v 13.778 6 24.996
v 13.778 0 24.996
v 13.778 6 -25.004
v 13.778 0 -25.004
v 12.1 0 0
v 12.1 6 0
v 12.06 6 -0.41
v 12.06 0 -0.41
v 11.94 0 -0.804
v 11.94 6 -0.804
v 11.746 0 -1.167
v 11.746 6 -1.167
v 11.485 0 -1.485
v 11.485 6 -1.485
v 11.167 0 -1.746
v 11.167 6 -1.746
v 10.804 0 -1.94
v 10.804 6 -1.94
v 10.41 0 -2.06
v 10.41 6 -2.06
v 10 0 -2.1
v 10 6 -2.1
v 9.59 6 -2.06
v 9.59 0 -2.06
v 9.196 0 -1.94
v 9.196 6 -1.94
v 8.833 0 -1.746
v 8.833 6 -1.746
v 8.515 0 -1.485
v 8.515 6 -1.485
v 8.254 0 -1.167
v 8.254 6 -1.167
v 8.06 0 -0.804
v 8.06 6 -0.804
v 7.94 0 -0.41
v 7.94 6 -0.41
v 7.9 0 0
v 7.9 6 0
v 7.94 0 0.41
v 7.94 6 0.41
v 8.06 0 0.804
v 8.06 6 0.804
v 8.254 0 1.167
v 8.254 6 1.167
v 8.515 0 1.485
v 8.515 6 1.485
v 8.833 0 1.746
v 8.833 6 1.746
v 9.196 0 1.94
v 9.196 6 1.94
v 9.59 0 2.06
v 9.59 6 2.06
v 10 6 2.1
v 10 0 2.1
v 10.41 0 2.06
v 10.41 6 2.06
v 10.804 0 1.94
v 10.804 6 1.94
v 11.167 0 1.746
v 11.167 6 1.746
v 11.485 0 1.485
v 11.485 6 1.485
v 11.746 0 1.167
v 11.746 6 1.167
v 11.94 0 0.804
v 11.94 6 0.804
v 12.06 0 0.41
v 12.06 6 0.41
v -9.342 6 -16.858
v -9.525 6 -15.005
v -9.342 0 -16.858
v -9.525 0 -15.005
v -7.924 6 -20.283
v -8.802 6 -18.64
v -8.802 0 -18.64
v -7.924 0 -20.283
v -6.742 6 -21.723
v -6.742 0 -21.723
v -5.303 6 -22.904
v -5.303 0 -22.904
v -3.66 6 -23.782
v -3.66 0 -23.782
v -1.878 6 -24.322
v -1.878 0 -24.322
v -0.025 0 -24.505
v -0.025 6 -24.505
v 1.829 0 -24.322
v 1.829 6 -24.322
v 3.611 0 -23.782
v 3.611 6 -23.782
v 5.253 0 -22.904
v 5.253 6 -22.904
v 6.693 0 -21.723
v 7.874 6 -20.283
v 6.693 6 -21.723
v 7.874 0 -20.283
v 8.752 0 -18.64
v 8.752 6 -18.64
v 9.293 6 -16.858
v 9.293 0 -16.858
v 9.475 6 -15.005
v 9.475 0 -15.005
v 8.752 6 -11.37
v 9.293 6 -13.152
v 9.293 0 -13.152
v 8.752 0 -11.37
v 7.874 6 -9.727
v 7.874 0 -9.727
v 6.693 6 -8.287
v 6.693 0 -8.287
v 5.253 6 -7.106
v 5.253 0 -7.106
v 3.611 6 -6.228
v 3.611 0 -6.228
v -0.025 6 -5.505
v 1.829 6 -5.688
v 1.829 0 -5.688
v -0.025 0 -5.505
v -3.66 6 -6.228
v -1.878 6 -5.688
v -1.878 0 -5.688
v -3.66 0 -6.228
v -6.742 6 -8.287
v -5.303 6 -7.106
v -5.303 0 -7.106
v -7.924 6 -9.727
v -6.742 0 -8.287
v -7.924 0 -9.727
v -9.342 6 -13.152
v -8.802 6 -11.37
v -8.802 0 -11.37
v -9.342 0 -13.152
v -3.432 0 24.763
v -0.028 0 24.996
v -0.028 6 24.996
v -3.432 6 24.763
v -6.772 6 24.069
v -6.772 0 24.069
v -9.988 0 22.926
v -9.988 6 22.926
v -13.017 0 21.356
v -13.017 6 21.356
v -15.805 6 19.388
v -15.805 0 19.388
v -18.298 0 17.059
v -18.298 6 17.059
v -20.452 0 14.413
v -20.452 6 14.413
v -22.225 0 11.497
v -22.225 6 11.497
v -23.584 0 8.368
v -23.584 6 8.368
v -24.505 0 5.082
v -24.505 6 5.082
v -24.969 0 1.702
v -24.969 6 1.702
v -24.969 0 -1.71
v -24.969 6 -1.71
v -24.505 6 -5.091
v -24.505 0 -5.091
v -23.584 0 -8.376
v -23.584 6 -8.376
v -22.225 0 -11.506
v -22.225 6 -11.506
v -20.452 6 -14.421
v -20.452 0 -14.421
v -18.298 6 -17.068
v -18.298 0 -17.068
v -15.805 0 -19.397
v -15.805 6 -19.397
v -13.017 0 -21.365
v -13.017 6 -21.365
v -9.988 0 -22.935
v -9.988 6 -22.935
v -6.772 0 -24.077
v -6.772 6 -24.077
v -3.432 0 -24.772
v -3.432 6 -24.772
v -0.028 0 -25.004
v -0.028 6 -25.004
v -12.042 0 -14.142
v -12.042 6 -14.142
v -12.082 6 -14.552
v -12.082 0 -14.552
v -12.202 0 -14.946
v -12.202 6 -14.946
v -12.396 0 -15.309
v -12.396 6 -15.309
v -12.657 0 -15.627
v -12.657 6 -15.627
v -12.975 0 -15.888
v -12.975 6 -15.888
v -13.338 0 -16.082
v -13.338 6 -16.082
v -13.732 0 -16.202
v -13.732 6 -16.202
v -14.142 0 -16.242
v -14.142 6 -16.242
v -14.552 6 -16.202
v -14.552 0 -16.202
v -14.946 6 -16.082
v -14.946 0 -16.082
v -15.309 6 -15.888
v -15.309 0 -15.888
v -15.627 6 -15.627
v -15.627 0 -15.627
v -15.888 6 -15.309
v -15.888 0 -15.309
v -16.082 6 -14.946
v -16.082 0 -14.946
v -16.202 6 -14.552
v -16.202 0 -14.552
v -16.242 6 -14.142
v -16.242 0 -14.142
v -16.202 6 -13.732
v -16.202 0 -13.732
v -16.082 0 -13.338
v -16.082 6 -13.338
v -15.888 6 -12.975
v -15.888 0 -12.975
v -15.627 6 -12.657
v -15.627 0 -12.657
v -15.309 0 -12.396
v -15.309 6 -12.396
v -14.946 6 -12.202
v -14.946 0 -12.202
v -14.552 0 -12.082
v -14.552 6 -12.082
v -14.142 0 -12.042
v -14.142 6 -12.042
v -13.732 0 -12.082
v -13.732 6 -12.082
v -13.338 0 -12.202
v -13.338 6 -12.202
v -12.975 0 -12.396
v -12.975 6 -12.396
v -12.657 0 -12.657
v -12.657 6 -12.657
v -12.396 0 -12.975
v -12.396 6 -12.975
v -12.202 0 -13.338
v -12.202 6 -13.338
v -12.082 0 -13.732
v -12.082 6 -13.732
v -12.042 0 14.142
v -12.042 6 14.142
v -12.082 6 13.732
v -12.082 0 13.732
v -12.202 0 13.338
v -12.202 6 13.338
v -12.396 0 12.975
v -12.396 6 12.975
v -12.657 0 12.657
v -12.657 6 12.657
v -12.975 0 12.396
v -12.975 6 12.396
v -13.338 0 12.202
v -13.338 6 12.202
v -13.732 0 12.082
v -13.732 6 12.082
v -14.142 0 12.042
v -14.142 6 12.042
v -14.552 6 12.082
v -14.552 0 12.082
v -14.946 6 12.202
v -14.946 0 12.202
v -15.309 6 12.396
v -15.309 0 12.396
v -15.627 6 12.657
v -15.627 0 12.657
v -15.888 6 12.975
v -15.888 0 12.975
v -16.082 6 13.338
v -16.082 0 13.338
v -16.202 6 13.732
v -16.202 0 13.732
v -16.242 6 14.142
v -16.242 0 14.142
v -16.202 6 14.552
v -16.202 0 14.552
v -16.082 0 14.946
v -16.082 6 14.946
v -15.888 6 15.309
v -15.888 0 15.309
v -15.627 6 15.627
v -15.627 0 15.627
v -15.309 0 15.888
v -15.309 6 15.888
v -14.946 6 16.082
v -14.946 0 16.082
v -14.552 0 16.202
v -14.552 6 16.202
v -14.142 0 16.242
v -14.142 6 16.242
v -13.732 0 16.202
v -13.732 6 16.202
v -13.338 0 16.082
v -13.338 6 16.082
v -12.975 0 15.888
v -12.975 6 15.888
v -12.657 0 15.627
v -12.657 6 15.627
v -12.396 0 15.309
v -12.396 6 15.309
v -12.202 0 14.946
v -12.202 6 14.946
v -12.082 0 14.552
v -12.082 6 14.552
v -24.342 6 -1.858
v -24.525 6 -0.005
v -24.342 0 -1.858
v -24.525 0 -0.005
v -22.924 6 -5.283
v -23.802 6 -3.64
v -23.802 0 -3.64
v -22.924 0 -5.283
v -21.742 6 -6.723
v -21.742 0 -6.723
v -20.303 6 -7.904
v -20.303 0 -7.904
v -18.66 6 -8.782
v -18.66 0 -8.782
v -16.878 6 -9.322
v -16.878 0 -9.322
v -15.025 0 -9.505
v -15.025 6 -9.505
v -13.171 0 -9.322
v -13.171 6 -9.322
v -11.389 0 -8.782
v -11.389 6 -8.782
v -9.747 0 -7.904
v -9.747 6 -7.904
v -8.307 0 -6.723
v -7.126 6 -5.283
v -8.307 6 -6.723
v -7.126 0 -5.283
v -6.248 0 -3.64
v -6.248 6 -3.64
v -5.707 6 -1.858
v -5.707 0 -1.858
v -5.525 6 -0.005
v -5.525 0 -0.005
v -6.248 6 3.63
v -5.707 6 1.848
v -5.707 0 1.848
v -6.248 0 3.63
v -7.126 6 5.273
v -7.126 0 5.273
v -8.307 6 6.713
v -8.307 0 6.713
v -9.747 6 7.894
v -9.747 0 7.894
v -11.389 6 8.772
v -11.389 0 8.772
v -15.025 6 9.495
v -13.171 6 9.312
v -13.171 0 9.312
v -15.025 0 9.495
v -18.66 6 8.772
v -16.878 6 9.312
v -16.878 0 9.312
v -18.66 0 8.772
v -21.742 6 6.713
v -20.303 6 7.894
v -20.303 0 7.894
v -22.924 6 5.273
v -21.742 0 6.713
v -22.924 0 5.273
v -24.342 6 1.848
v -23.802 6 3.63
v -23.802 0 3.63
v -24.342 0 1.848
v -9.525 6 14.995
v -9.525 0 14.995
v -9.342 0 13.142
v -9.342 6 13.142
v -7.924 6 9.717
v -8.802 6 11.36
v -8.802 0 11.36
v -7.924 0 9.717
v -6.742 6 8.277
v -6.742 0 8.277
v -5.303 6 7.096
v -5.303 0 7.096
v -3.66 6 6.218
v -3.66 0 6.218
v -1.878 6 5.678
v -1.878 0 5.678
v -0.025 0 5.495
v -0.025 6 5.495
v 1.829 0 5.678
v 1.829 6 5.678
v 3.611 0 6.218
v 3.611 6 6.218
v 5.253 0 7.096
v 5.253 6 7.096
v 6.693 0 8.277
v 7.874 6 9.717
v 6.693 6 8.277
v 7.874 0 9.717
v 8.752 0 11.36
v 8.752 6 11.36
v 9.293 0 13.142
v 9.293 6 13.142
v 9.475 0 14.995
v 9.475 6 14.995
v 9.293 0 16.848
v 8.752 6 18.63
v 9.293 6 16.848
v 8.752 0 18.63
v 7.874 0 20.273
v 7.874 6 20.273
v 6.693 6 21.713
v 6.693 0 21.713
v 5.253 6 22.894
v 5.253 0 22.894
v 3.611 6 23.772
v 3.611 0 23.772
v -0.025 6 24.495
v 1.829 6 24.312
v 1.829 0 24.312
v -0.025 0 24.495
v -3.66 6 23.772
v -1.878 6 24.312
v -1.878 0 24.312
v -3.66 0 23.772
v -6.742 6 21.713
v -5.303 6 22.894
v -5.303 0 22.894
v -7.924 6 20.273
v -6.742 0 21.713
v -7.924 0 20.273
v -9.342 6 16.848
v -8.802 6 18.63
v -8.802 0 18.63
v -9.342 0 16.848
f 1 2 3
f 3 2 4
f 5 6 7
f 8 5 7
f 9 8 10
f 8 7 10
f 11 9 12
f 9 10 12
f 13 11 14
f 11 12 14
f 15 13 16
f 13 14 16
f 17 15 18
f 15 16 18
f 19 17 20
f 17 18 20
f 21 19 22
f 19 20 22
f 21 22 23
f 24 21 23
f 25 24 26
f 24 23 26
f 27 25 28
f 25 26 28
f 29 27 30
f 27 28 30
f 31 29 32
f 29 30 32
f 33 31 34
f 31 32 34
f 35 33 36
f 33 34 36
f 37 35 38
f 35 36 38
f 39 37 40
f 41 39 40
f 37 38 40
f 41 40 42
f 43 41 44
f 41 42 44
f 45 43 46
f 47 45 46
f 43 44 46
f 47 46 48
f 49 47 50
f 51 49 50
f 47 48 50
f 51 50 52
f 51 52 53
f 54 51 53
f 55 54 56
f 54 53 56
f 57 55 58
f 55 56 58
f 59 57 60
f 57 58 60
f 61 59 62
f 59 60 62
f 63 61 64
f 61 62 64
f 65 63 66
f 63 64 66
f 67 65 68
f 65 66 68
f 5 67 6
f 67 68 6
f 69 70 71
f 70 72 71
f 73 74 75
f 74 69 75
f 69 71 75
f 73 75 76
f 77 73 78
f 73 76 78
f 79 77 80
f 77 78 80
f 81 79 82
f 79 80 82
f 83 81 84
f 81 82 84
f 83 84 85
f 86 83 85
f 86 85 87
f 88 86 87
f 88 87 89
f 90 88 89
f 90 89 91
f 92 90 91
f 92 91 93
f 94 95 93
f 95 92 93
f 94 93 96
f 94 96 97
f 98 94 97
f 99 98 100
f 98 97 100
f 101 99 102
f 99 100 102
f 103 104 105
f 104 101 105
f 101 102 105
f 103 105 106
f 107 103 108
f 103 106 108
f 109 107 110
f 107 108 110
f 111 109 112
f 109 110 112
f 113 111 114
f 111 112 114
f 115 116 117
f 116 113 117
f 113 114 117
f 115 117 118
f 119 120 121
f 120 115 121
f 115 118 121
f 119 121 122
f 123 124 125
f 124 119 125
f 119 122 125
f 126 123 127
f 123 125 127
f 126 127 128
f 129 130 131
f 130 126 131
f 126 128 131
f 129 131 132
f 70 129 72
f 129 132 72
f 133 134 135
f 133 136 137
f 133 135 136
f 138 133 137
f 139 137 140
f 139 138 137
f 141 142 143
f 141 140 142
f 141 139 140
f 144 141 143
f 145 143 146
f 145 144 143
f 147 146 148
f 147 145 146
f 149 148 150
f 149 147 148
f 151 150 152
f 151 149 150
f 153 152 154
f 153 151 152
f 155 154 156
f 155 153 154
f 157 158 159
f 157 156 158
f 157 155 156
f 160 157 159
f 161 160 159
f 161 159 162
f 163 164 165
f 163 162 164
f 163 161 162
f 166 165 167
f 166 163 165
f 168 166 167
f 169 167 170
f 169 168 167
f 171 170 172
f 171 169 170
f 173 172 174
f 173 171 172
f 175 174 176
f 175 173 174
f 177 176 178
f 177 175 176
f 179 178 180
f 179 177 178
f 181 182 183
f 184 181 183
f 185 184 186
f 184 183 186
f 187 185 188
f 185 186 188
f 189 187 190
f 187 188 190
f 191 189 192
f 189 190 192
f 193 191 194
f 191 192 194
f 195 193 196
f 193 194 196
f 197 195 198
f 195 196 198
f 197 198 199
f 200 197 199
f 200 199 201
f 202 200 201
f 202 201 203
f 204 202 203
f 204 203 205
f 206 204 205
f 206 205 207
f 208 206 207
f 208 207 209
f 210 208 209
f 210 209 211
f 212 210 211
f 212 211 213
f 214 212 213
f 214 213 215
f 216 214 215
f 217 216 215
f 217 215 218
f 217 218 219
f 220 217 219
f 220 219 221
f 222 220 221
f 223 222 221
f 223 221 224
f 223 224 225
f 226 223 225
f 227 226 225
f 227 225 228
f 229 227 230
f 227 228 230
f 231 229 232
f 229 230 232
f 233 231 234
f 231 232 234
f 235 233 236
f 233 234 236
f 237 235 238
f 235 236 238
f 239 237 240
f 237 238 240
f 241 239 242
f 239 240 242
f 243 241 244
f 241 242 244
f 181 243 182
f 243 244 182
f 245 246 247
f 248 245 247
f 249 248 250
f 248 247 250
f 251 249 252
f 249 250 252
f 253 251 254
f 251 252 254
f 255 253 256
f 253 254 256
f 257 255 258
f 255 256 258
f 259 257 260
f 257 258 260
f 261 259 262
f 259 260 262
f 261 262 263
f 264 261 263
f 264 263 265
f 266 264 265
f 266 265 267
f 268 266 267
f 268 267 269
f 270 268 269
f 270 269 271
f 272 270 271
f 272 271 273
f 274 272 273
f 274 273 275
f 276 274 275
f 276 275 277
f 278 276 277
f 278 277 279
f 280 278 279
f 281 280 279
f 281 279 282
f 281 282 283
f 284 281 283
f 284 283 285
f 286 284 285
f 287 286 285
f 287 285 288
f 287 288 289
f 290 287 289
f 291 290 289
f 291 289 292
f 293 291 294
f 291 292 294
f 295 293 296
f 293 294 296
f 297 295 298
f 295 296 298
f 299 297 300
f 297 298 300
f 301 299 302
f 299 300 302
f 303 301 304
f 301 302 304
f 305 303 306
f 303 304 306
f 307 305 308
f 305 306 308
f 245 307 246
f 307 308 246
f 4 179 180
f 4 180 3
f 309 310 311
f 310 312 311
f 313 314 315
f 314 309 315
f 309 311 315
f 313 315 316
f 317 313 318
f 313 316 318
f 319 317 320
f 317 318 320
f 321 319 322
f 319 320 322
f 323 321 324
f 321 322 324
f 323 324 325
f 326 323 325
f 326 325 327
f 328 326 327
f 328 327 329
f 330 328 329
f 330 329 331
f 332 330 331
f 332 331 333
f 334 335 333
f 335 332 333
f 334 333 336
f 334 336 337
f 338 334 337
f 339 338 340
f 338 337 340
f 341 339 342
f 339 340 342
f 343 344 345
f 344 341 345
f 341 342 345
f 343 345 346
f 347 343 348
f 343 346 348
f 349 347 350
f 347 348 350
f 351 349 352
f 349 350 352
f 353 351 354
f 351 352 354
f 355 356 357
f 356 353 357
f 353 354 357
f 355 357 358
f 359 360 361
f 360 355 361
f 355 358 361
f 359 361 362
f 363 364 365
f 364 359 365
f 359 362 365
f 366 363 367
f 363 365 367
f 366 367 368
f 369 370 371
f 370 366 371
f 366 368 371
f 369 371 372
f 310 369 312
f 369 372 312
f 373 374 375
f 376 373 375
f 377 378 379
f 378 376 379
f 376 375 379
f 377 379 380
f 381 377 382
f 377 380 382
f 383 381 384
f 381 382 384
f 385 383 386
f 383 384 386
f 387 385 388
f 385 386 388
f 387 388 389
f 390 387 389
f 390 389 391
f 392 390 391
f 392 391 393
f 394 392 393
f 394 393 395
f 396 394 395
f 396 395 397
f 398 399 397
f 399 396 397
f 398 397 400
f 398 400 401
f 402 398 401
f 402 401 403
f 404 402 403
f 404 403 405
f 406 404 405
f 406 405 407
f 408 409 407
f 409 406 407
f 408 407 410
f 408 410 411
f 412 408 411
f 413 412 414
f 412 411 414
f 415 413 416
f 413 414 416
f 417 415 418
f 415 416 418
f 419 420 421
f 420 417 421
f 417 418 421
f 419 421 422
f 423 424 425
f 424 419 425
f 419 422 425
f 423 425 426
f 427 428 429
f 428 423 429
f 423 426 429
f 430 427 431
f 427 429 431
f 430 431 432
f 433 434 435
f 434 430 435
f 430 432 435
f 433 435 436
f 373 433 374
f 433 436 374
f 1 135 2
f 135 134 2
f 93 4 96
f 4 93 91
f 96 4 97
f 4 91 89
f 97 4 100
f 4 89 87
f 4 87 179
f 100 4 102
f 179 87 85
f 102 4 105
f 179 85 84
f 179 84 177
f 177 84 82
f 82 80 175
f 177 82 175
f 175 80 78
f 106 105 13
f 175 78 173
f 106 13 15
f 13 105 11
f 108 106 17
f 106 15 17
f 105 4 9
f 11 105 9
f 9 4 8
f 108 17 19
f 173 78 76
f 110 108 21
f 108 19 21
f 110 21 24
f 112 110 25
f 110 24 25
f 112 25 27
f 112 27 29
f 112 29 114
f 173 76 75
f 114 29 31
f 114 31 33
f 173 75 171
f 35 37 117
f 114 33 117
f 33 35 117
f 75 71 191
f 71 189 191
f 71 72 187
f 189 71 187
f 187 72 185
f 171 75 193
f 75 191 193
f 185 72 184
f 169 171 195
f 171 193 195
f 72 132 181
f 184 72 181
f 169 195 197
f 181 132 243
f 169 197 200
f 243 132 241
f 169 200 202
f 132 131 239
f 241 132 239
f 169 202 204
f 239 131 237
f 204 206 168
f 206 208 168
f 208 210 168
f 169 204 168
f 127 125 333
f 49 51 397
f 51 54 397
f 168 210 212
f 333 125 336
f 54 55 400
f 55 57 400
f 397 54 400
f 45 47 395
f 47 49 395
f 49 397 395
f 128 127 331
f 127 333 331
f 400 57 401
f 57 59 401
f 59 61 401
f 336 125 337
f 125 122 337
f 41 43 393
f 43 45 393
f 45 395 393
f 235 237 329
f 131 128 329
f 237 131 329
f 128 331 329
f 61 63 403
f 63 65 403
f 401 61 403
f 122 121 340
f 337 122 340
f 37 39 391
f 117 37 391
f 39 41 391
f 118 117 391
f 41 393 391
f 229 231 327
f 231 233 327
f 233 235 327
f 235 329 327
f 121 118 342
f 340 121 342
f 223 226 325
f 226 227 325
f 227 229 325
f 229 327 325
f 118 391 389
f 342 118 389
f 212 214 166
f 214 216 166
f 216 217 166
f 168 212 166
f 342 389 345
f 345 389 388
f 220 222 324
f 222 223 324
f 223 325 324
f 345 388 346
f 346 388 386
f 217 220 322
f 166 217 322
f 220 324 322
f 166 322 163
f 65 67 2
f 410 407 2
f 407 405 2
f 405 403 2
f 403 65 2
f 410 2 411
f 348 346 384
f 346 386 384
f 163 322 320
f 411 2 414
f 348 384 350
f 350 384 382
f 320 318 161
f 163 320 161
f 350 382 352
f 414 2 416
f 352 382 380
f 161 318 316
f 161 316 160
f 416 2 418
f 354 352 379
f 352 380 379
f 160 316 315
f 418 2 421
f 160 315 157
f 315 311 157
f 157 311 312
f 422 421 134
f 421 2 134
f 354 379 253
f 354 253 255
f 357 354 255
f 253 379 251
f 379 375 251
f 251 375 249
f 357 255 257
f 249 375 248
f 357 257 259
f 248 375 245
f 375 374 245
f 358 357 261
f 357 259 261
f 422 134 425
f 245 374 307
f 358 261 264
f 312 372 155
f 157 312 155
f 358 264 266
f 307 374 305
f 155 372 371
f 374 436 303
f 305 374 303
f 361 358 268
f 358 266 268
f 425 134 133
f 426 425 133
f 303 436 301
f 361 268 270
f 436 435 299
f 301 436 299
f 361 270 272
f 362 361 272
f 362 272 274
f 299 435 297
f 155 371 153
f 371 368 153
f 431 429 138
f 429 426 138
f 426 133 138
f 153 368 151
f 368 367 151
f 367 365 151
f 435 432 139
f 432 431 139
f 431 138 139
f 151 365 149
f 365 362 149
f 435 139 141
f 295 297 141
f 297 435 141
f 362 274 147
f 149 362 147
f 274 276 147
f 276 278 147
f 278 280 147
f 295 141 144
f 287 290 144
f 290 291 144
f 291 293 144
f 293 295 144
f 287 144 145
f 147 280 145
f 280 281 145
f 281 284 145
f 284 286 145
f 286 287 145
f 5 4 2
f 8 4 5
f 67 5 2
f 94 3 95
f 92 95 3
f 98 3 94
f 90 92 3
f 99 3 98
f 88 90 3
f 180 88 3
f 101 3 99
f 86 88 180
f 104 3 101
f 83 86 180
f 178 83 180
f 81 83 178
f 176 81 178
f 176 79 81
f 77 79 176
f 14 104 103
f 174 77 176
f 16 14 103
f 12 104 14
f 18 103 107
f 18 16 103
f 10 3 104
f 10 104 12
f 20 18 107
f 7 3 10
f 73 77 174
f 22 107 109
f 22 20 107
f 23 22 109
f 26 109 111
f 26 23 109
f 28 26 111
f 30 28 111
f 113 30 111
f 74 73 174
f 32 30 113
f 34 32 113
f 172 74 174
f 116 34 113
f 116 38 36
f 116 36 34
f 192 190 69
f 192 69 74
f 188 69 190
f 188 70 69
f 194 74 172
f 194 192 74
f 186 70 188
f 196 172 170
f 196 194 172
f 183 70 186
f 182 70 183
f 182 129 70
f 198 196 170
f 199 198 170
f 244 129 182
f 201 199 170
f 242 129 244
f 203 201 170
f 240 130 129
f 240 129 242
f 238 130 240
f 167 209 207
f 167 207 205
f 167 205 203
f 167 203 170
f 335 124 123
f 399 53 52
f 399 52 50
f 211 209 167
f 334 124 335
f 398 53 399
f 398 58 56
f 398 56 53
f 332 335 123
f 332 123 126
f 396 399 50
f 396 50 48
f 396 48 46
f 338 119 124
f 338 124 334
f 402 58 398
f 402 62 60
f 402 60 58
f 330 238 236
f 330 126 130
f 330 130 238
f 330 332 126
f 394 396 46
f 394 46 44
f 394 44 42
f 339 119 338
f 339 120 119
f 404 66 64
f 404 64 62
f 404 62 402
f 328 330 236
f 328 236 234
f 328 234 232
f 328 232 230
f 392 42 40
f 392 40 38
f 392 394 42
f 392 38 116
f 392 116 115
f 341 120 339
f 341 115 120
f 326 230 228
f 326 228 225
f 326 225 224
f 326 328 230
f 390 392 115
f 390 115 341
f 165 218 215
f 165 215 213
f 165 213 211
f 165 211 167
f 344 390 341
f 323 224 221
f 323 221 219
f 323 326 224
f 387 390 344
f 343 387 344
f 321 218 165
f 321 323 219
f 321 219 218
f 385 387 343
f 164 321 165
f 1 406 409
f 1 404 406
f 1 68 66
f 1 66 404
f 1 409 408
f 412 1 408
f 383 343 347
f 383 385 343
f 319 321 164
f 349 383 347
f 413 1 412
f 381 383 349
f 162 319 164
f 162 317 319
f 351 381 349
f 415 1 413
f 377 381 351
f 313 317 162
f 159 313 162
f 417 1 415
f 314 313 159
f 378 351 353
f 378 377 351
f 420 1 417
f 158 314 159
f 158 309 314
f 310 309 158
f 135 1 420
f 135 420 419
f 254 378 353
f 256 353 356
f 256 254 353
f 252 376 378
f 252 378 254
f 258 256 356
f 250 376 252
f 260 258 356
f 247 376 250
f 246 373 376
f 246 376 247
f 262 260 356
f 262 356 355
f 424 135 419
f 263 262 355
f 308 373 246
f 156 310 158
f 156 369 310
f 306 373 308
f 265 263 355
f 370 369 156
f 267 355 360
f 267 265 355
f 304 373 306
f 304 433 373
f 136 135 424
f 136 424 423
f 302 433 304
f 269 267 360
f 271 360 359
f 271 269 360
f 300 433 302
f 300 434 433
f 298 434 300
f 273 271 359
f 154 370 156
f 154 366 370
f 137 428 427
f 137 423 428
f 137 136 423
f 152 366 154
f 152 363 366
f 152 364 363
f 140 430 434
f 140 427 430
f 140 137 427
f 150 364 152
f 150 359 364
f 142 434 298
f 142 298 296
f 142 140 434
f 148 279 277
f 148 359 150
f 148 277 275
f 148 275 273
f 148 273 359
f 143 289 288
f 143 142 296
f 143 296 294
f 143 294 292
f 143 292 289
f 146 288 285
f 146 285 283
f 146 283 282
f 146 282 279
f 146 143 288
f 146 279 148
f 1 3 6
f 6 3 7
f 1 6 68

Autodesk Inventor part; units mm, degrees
ref_plane "YZ Plane" through (0, 0, 0) normal (1, 0, 0) x (0, 1, 0)
ref_plane "XZ Plane" through (0, 0, 0) normal (0, 1, 0) x (-1, 0, 0)
ref_plane "XY Plane" through (0, 0, 0) normal (0, 0, 1) x (1, 0, 0)
sketch "Эскиз1" plane through (0, 0, 0) normal (0, 1, 0) x (-1, 0, 0)
  circle A0 centre (15.0247, -0.005) radius 9.5
  circle A1 centre (0.0247, 14.995) radius 9.5
  circle A2 centre (0.0247, -15.005) radius 9.5
  arc A3 (-4.923, -24.5094) -> (-4.9258, 24.5) centre (0.0275, -0.0044) ccw
  arc A4 (-13.7779, 22.8932) -> (-4.9258, 24.5) centre (-49.9753, 247.495) ccw
  line L0 (-13.7779, 22.8932) -> (-13.7779, -22.9031)
  arc A5 (-4.923, -24.5094) -> (-4.9258, 24.5) centre (0.0275, -0.0044) ccw
  circle A6 centre (15.0247, -0.005) radius 9.5
  circle A7 centre (0.0247, 14.995) radius 9.5
  circle A8 centre (0.0247, -15.005) radius 9.5
  arc A9 (-4.923, -24.5094) -> (-4.9258, 24.5) centre (0.0275, -0.0044) ccw
  arc A10 (-13.7779, 22.8932) -> (-4.9258, 24.5) centre (-49.9753, 247.495) ccw
  arc A11 (-4.923, -24.5094) -> (-13.7779, -22.9031) centre (-49.9479, -247.5094) ccw
  line L1 (-13.7779, 22.8932) -> (-13.7779, -22.9031)
  arc A12 (-4.923, -24.5094) -> (-4.9258, 24.5) centre (0.0275, -0.0044) ccw
  line L2 (0.0275, -25.0044) -> (-13.7779, -25.0044)
  line L3 (-13.7779, -25.0044) -> (-13.7779, -22.9031)
  line L4 (0.0275, 24.9956) -> (-13.7779, 24.9956)
  line L5 (-13.7779, 24.9956) -> (-13.7779, 22.8932)
  point P0 (0, 0)
extrude "Выдавливание1" add sketch "Эскиз1" along normal blind 6
sketch "Эскиз2" plane through (0, 6, 0) normal (0, 1, 0) x (1, 0, 0)
  line L0 (0, 0) -> (10, 0)
  circle A0 centre (10, 0) radius 2.1
  line L1 (0, 0) -> (-14.1421, -14.1421)
  line L2 (0, 0) -> (20, 0) construction
  line L3 (0, 0) -> (-14.1421, 14.1421)
  circle A1 centre (-14.1421, -14.1421) radius 2.1
  circle A2 centre (-14.1421, 14.1421) radius 2.1
  dimension "d2" = 10
  dimension "d3" = 4.2
  dimension "d4" = 20
  dimension "d5" = 135
  dimension "d6" = 20
  dimension "d7" = 90
  dimension "d8" = 4.2
  dimension "d9" = 4.2
extrude "Выдавливание2" cut sketch "Эскиз2" against normal blind 15.25
equation "\"d3\" = d9"
equation "\"d8\" = d9"
properties part number "000.403 -  Прижим подшипников"
